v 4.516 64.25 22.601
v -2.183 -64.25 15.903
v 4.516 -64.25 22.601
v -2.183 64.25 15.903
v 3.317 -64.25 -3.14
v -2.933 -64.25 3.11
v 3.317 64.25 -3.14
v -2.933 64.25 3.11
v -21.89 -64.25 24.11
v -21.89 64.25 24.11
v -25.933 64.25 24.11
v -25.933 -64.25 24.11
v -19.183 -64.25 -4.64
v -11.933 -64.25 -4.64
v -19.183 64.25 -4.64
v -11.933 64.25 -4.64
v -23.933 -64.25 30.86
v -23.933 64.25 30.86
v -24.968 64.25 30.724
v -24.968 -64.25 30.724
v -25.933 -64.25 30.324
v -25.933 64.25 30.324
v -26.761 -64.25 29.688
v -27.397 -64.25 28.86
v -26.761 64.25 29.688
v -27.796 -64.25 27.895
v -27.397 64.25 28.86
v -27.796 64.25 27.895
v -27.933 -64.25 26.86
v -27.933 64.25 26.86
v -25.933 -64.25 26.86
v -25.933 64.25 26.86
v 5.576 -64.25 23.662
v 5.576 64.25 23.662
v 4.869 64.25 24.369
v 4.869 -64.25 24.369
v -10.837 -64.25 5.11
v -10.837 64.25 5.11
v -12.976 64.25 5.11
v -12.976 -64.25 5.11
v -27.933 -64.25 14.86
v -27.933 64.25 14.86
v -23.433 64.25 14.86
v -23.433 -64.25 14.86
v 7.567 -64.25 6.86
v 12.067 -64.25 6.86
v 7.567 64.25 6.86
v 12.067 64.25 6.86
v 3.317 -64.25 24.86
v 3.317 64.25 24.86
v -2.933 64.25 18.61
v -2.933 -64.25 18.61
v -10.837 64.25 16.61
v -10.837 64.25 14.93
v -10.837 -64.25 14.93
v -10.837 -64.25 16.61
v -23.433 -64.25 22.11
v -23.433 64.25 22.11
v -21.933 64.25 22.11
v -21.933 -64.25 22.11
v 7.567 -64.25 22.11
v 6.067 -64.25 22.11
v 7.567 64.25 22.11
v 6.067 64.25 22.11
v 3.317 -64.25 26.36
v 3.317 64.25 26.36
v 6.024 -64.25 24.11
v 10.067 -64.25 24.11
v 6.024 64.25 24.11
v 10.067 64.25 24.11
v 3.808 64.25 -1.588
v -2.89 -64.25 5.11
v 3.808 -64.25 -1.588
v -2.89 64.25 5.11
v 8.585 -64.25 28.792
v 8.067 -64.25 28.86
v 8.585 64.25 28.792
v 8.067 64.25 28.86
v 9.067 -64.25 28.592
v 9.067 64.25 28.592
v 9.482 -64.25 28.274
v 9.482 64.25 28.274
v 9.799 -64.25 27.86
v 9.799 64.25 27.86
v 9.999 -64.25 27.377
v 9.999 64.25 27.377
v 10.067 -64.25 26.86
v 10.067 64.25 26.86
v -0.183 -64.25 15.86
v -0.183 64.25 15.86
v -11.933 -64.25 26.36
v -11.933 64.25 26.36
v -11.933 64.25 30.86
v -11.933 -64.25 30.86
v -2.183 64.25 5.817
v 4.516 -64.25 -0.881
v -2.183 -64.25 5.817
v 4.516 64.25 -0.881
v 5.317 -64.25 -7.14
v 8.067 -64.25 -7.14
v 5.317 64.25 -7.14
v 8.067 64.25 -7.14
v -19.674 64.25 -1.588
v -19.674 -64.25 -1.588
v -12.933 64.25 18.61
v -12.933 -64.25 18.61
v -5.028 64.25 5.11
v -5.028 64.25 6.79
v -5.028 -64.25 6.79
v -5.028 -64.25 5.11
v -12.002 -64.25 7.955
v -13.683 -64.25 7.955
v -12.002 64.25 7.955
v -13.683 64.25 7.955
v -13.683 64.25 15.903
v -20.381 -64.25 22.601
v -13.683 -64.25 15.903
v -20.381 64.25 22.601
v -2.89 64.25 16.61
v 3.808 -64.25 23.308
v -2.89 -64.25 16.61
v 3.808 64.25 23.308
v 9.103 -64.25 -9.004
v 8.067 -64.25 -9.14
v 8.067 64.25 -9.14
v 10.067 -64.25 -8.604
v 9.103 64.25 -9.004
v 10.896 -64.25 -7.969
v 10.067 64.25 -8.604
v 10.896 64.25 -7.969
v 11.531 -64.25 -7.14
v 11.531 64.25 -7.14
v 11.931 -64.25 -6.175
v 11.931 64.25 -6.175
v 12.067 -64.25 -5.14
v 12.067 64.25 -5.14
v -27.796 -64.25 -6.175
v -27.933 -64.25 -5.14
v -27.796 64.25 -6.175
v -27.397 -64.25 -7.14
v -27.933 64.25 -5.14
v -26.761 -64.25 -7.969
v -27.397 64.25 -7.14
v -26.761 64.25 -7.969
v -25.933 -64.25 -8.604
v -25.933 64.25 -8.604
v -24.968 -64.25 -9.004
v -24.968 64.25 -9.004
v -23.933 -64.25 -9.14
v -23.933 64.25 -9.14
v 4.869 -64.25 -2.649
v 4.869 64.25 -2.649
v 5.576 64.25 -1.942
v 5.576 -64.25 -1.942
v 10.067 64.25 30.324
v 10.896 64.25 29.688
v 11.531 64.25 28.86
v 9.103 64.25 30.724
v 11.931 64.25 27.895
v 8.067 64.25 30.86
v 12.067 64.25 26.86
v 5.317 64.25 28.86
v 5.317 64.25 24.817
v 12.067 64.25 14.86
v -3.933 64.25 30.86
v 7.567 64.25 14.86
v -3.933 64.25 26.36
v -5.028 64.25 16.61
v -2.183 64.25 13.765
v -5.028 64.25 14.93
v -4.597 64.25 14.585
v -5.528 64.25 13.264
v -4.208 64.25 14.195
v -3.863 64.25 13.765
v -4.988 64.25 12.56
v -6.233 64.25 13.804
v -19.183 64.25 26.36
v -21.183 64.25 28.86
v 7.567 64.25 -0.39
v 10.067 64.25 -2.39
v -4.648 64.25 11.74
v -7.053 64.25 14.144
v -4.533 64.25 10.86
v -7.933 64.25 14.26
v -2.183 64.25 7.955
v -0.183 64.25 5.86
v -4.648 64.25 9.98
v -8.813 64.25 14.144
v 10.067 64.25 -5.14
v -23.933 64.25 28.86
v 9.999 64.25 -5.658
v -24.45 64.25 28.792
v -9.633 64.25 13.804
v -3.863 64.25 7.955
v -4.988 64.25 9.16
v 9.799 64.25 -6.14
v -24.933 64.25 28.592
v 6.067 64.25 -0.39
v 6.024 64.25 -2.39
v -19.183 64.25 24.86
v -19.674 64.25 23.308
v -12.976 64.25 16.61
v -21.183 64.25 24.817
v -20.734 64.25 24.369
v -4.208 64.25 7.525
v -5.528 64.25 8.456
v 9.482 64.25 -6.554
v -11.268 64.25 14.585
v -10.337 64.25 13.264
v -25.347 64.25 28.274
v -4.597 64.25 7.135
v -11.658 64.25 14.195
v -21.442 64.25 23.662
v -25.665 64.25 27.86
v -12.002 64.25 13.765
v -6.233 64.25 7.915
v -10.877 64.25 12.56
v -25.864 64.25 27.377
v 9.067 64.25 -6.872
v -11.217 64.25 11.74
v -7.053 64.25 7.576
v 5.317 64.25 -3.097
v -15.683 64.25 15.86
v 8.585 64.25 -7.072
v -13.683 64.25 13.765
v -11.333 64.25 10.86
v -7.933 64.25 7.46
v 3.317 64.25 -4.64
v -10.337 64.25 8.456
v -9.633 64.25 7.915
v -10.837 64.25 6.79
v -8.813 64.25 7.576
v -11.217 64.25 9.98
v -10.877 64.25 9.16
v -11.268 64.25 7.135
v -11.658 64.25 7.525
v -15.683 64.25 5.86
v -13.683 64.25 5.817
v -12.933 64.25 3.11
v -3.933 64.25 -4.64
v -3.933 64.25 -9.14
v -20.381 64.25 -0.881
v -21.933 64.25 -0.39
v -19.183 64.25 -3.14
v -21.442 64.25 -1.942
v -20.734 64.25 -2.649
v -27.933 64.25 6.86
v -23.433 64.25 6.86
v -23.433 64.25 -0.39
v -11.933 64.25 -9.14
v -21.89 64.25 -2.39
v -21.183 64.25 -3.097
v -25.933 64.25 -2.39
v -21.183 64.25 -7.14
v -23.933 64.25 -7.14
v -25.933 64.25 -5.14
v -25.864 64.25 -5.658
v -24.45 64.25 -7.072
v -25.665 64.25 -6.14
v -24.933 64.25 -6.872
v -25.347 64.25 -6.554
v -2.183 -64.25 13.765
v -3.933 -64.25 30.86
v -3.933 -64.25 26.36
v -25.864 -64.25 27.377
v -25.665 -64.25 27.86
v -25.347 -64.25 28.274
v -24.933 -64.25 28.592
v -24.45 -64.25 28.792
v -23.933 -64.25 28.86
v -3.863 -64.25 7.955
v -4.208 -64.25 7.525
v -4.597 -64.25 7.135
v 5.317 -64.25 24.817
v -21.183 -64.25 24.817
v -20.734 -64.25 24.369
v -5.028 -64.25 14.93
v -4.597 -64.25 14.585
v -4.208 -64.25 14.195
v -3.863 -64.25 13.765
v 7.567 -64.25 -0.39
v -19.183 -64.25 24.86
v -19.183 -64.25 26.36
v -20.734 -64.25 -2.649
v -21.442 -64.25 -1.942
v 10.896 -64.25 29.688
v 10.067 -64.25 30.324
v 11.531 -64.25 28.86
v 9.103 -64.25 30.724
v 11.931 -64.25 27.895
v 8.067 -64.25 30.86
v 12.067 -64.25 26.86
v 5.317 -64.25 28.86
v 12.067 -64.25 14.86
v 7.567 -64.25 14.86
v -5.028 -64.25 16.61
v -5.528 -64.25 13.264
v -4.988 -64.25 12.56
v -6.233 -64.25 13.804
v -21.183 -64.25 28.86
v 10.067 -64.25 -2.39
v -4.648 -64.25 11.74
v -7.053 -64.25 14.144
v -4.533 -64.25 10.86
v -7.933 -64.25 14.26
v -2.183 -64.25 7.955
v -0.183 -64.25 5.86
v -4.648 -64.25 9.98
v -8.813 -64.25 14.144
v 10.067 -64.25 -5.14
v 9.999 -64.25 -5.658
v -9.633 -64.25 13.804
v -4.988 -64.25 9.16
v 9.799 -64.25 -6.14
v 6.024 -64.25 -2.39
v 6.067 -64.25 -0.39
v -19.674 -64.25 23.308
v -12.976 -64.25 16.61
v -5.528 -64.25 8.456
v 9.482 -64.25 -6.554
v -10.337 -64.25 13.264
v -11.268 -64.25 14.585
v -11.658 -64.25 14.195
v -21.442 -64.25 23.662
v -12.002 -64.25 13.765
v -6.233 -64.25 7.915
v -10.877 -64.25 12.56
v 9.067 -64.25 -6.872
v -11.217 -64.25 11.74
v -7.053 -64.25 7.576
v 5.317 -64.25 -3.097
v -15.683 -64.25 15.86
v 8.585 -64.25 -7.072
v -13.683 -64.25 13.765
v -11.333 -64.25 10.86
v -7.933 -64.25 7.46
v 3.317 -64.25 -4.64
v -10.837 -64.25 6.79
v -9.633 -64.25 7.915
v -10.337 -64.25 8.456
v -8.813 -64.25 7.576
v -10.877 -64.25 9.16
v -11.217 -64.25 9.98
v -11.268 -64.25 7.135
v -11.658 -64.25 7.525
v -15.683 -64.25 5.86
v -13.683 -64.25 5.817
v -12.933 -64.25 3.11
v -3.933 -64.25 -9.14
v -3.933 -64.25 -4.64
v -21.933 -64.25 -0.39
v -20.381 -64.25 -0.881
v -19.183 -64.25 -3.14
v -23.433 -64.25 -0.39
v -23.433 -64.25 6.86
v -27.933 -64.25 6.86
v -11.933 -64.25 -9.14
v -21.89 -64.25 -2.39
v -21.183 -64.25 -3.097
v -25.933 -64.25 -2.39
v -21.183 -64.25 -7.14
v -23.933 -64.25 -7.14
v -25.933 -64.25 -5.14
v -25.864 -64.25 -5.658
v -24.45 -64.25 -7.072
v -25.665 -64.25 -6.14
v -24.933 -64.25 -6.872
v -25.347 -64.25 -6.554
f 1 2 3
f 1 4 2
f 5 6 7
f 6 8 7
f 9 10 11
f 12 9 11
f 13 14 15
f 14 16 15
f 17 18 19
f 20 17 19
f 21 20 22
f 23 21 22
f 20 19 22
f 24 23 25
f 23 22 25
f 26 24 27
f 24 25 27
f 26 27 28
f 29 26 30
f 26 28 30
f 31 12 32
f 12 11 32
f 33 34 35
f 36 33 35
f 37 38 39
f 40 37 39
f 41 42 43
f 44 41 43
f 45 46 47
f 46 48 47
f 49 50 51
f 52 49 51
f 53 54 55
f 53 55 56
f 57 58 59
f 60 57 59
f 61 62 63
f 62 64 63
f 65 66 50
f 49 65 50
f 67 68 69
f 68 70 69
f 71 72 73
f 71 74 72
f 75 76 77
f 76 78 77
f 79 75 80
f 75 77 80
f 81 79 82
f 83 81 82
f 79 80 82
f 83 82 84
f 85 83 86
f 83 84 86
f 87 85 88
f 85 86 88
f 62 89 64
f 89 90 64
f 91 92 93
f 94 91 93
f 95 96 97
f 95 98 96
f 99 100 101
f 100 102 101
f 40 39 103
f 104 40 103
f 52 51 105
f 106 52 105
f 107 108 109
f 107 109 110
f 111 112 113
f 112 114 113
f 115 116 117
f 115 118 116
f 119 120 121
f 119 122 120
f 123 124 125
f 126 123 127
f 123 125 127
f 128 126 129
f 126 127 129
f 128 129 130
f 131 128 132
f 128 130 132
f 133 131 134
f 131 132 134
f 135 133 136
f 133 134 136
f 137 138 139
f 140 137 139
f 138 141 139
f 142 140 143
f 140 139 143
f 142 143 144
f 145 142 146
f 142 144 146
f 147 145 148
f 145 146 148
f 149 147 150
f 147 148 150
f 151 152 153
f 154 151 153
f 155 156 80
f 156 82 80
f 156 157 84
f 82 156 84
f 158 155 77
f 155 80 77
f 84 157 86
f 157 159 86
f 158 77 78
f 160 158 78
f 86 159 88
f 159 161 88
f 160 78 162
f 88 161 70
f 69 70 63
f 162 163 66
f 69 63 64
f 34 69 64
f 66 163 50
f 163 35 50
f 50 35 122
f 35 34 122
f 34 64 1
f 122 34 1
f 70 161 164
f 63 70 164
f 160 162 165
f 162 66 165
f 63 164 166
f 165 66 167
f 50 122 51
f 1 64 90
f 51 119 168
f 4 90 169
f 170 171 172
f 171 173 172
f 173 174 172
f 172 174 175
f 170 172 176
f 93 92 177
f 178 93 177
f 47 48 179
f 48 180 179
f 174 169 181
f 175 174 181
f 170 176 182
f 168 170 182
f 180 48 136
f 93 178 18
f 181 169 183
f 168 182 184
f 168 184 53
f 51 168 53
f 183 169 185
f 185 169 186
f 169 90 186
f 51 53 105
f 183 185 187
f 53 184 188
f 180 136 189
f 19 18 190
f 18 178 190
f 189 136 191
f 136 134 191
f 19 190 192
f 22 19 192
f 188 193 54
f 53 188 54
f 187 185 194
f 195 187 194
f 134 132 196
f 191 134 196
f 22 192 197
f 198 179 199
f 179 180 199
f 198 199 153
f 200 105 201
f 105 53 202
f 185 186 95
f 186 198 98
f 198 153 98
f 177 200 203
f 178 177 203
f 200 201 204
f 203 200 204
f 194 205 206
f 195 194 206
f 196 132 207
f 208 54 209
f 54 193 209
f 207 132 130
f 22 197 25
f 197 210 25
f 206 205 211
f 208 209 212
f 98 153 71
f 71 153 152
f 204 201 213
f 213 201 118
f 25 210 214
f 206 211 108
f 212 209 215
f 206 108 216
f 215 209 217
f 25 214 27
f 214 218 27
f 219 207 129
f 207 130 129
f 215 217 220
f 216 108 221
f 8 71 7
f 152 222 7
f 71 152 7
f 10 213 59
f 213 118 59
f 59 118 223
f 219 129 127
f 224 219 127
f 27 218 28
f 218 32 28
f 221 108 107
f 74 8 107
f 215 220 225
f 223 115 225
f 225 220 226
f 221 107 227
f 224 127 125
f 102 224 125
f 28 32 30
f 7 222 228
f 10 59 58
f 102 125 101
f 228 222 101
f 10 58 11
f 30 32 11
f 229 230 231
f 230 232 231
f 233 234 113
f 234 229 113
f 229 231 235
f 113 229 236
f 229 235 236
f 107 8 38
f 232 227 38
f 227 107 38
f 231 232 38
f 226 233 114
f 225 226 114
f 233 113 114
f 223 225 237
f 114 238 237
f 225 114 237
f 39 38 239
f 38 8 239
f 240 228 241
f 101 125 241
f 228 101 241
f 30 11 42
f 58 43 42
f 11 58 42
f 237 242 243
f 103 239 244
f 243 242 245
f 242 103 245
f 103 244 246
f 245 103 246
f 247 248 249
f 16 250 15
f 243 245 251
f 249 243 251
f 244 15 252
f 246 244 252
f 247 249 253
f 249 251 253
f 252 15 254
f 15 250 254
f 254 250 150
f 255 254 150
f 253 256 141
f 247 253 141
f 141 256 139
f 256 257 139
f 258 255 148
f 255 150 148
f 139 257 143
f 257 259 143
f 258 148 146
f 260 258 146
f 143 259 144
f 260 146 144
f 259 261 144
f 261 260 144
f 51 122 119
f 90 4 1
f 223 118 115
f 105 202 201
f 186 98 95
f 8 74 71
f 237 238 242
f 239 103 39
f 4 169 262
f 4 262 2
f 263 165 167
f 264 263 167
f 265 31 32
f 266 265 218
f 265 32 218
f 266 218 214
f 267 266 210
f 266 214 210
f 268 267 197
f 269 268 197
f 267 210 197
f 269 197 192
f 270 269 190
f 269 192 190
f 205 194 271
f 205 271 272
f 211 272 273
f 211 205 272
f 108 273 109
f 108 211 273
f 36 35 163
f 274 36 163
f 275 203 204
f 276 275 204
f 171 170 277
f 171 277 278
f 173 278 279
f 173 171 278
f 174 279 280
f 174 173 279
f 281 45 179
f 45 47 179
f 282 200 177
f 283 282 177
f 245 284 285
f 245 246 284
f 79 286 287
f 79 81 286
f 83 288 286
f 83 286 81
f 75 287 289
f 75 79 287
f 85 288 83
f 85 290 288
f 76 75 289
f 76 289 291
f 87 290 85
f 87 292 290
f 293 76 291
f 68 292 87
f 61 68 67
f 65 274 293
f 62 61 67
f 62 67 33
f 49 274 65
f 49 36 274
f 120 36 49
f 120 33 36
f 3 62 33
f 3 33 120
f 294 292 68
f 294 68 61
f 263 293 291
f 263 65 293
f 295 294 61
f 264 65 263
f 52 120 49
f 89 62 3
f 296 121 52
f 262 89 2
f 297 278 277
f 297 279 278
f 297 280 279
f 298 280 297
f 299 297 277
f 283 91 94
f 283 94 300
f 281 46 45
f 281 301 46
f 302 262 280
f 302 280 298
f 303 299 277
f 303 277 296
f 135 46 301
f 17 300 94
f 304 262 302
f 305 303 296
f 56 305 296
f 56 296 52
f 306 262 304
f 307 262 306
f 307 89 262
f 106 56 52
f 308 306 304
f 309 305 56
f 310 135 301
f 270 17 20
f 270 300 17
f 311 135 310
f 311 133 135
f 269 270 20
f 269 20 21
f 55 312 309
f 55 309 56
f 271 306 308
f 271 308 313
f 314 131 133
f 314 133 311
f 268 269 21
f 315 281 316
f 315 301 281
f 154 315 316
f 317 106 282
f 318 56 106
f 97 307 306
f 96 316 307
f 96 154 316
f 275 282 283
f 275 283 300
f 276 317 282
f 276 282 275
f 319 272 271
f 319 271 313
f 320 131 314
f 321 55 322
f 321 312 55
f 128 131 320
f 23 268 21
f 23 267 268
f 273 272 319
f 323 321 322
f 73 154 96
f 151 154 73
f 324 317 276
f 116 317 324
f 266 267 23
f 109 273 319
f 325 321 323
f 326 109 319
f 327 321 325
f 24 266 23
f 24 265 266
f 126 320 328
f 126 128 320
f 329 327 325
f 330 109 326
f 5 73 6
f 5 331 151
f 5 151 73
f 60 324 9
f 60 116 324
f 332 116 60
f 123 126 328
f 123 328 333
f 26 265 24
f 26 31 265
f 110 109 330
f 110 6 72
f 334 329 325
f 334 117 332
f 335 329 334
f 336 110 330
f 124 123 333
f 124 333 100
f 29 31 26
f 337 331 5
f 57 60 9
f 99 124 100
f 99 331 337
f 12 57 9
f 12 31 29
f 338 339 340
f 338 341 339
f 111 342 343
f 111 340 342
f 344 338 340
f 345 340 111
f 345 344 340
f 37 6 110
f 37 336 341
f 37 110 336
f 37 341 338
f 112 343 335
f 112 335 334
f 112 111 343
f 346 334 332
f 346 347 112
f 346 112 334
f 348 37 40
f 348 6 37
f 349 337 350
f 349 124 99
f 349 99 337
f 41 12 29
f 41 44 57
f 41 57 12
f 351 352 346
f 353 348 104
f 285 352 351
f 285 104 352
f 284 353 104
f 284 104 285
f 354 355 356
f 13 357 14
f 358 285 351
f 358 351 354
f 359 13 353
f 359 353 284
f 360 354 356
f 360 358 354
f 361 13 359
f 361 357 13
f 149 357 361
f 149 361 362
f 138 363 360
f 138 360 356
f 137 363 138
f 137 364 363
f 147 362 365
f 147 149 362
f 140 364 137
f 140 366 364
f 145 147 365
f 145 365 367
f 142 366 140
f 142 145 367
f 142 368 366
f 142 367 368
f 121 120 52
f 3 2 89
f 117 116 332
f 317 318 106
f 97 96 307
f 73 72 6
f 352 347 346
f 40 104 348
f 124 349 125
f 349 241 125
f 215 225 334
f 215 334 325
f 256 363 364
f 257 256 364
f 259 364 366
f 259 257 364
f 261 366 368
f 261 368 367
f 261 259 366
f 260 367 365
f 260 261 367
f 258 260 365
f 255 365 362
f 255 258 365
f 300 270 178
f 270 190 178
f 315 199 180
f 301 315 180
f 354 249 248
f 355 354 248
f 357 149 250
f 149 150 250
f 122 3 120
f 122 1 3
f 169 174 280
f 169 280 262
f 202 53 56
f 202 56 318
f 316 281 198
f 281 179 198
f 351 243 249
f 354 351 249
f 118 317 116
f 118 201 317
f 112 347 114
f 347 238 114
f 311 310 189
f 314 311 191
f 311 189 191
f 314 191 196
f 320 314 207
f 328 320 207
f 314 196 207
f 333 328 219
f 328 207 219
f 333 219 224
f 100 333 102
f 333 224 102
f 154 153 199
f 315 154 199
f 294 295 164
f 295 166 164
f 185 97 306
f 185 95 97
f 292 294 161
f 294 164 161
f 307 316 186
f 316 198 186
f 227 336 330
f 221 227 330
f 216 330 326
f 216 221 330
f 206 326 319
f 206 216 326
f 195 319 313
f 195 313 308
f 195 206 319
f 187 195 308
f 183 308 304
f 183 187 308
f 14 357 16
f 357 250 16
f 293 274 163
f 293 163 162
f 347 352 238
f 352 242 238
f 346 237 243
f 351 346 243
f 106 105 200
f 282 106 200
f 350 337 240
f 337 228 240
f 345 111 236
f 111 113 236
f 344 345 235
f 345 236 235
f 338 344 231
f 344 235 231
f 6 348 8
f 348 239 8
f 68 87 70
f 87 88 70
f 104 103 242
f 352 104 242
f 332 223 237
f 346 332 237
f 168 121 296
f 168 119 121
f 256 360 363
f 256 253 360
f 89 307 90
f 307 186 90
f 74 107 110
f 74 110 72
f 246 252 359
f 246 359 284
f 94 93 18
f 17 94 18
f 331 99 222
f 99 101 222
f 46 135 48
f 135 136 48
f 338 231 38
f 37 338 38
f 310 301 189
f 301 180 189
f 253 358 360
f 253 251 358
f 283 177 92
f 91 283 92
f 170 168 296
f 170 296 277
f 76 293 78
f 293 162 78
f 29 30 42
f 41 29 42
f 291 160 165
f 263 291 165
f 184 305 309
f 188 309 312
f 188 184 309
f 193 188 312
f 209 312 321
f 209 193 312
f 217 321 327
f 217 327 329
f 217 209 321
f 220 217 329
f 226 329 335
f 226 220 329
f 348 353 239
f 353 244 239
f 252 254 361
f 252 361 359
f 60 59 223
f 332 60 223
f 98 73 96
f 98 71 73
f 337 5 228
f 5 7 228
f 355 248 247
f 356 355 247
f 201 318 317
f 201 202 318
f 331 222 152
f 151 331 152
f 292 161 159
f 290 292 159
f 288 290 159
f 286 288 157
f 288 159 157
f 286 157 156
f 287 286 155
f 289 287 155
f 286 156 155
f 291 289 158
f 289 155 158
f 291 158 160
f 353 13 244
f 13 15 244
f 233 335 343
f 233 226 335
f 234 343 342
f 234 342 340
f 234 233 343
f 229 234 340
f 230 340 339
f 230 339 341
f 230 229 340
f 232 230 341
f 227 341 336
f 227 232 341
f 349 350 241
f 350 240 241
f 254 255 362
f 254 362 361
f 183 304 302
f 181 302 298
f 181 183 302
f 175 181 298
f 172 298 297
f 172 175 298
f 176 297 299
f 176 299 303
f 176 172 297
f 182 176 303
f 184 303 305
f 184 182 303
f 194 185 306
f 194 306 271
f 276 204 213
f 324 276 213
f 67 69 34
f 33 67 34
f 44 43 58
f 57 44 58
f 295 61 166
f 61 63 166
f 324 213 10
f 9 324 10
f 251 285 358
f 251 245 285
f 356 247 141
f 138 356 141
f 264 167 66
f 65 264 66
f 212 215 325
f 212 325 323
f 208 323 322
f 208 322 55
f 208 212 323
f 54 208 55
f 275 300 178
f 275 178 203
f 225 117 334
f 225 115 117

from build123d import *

# Parameters (mm, degrees)
BOSS_EXTRUDE1_DEPTH = 64.25


with BuildPart() as part:
    # Sketch1 → Boss-Extrude1 (new body, symmetric)
    with BuildSketch(Plane(origin=(0, 0, 0), x_dir=(1, 0, 0), z_dir=(0, 1, 0))):
        with BuildLine():
            Line((-27.932619, -6.859853), (-27.932619, 5.140147))
            ThreePointArc((-27.932619, 5.140147), (-26.761046, 7.968574), (-23.932619, 9.140147))
            Line((-23.932619, 9.140147), (-11.932619, 9.140147))
            Line((-11.932619, 9.140147), (-11.932619, 4.640147))
            Line((-11.932619, 4.640147), (-19.182619, 4.640147))
            Line((-19.182619, 4.640147), (-19.182619, 3.140147))
            Line((-19.182619, 3.140147), (-12.932619, -3.109853))
            Line((-12.932619, -3.109853), (-7.932619, -3.109853))
            Line((-7.932619, -3.109853), (-2.932619, -3.109853))
            Line((-2.932619, -3.109853), (3.317381, 3.140147))
            Line((3.317381, 3.140147), (3.317381, 4.640147))
            Line((3.317381, 4.640147), (-3.932619, 4.640147))
            Line((-3.932619, 4.640147), (-3.932619, 9.140147))
            Line((-3.932619, 9.140147), (8.067381, 9.140147))
            ThreePointArc((8.067381, 9.140147), (10.895808, 7.968574), (12.067381, 5.140147))
            Line((12.067381, 5.140147), (12.067381, -6.859853))
            Line((12.067381, -6.859853), (7.567381, -6.859853))
            Line((7.567381, -6.859853), (7.567381, 0.390147))
            Line((7.567381, 0.390147), (6.067381, 0.390147))
            Line((6.067381, 0.390147), (-0.182619, -5.859853))
            Line((-0.182619, -5.859853), (-0.182619, -10.859853))
            Line((-0.182619, -10.859853), (-0.182619, -15.859853))
            Line((-0.182619, -15.859853), (6.067381, -22.109853))
            Line((6.067381, -22.109853), (7.567381, -22.109853))
            Line((7.567381, -22.109853), (7.567381, -14.859853))
            Line((7.567381, -14.859853), (12.067381, -14.859853))
            Line((12.067381, -14.859853), (12.067381, -26.859853))
            ThreePointArc((12.067381, -26.859853), (10.895808, -29.68828), (8.067381, -30.859853))
            Line((8.067381, -30.859853), (-3.932619, -30.859853))
            Line((-3.932619, -30.859853), (-3.932619, -26.359853))
            Line((-3.932619, -26.359853), (3.317381, -26.359853))
            Line((3.317381, -26.359853), (3.317381, -24.859853))
            Line((3.317381, -24.859853), (-2.932619, -18.609853))
            Line((-2.932619, -18.609853), (-7.932619, -18.609853))
            Line((-7.932619, -18.609853), (-12.932619, -18.609853))
            Line((-12.932619, -18.609853), (-19.182619, -24.859853))
            Line((-19.182619, -24.859853), (-19.182619, -26.359853))
            Line((-19.182619, -26.359853), (-11.932619, -26.359853))
            Line((-11.932619, -26.359853), (-11.932619, -30.859853))
            Line((-11.932619, -30.859853), (-23.932619, -30.859853))
            ThreePointArc((-23.932619, -30.859853), (-26.761046, -29.68828), (-27.932619, -26.859853))
            Line((-27.932619, -26.859853), (-27.932619, -14.859853))
            Line((-27.932619, -14.859853), (-23.432619, -14.859853))
            Line((-23.432619, -14.859853), (-23.432619, -22.109853))
            Line((-23.432619, -22.109853), (-21.932619, -22.109853))
            Line((-21.932619, -22.109853), (-15.682619, -15.859853))
            Line((-15.682619, -15.859853), (-15.682619, -10.859853))
            Line((-15.682619, -10.859853), (-15.682619, -5.859853))
            Line((-15.682619, -5.859853), (-21.932619, 0.390147))
            Line((-21.932619, 0.390147), (-23.432619, 0.390147))
            Line((-23.432619, 0.390147), (-23.432619, -6.859853))
            Line((-23.432619, -6.859853), (-27.932619, -6.859853))
        make_face()
        with BuildLine():
            Line((-25.932619, 2.390147), (-25.932619, 5.140147))
            ThreePointArc((-25.932619, 5.140147), (-25.346832, 6.554361), (-23.932619, 7.140147))
            Line((-23.932619, 7.140147), (-21.182619, 7.140147))
            Line((-21.182619, 7.140147), (-21.182619, 3.097254))
            Line((-21.182619, 3.097254), (-20.734396, 2.649031))
            Line((-20.734396, 2.649031), (-21.441502, 1.941924))
            Line((-21.441502, 1.941924), (-21.889726, 2.390147))
            Line((-21.889726, 2.390147), (-25.932619, 2.390147))
        make_face(mode=Mode.SUBTRACT)
        with BuildLine():
            Line((-20.380842, 0.881264), (-13.682619, -5.816959))
            Line((-13.682619, -5.816959), (-13.682619, -7.955115))
            Line((-13.682619, -7.955115), (-13.182619, -7.955115))
            Line((-13.182619, -7.955115), (-12.002324, -7.955115))
            ThreePointArc((-12.002324, -7.955115), (-11.468153, -7.324319), (-10.837356, -6.790148))
            Line((-10.837356, -6.790148), (-10.837356, -5.609853))
            Line((-10.837356, -5.609853), (-10.837356, -5.109853))
            Line((-10.837356, -5.109853), (-12.975512, -5.109853))
            Line((-12.975512, -5.109853), (-19.673735, 1.588371))
            Line((-19.673735, 1.588371), (-20.380842, 0.881264))
        make_face(mode=Mode.SUBTRACT)
        with BuildLine():
            Line((10.067381, 2.390147), (10.067381, 5.140147))
            ThreePointArc((10.067381, 5.140147), (9.481595, 6.554361), (8.067381, 7.140147))
            Line((8.067381, 7.140147), (5.317381, 7.140147))
            Line((5.317381, 7.140147), (5.317381, 3.097254))
            Line((5.317381, 3.097254), (4.869158, 2.649031))
            Line((4.869158, 2.649031), (5.576265, 1.941924))
            Line((5.576265, 1.941924), (6.024488, 2.390147))
            Line((6.024488, 2.390147), (10.067381, 2.390147))
        make_face(mode=Mode.SUBTRACT)
        with BuildLine():
            Line((-2.182619, -5.816959), (-2.182619, -7.955115))
            Line((-2.182619, -7.955115), (-2.682619, -7.955115))
            Line((-2.682619, -7.955115), (-3.862914, -7.955115))
            ThreePointArc((-3.862914, -7.955115), (-4.397085, -7.324319), (-5.027881, -6.790148))
            Line((-5.027881, -6.790148), (-5.027881, -5.609853))
            Line((-5.027881, -5.609853), (-5.027881, -5.109853))
            Line((-5.027881, -5.109853), (-2.889726, -5.109853))
            Line((-2.889726, -5.109853), (3.808498, 1.588371))
            Line((3.808498, 1.588371), (4.515604, 0.881264))
            Line((4.515604, 0.881264), (-2.182619, -5.816959))
        make_face(mode=Mode.SUBTRACT)
        with BuildLine():
            Line((5.317381, -28.859853), (8.067381, -28.859853))
            ThreePointArc((8.067381, -28.859853), (9.481595, -28.274066), (10.067381, -26.859853))
            Line((10.067381, -26.859853), (10.067381, -24.109853))
            Line((10.067381, -24.109853), (6.024488, -24.109853))
            Line((6.024488, -24.109853), (5.576265, -23.661629))
            Line((5.576265, -23.661629), (4.869158, -24.368736))
            Line((4.869158, -24.368736), (5.317381, -24.816959))
            Line((5.317381, -24.816959), (5.317381, -28.859853))
        make_face(mode=Mode.SUBTRACT)
        with BuildLine():
            Line((-2.889726, -16.609853), (-5.027881, -16.609853))
            Line((-5.027881, -16.609853), (-5.027881, -16.109853))
            Line((-5.027881, -16.109853), (-5.027881, -14.929558))
            ThreePointArc((-5.027881, -14.929558), (-4.397085, -14.395387), (-3.862914, -13.76459))
            Line((-3.862914, -13.76459), (-2.682619, -13.76459))
            Line((-2.682619, -13.76459), (-2.182619, -13.76459))
            Line((-2.182619, -13.76459), (-2.182619, -15.902746))
            Line((-2.182619, -15.902746), (4.515604, -22.600969))
            Line((4.515604, -22.600969), (3.808498, -23.308076))
            Line((3.808498, -23.308076), (-2.889726, -16.609853))
        make_face(mode=Mode.SUBTRACT)
        with BuildLine():
            Line((-25.932619, -24.109853), (-25.932619, -26.859853))
            ThreePointArc((-25.932619, -26.859853), (-25.346832, -28.274066), (-23.932619, -28.859853))
            Line((-23.932619, -28.859853), (-21.182619, -28.859853))
            Line((-21.182619, -28.859853), (-21.182619, -24.816959))
            Line((-21.182619, -24.816959), (-20.734396, -24.368736))
            Line((-20.734396, -24.368736), (-21.441502, -23.661629))
            Line((-21.441502, -23.661629), (-21.889726, -24.109853))
            Line((-21.889726, -24.109853), (-25.932619, -24.109853))
        make_face(mode=Mode.SUBTRACT)
        with BuildLine():
            Line((-13.682619, -15.902746), (-13.682619, -13.76459))
            Line((-13.682619, -13.76459), (-13.182619, -13.76459))
            Line((-13.182619, -13.76459), (-12.002324, -13.76459))
            ThreePointArc((-12.002324, -13.76459), (-11.468153, -14.395387), (-10.837356, -14.929558))
            Line((-10.837356, -14.929558), (-10.837356, -16.109853))
            Line((-10.837356, -16.109853), (-10.837356, -16.609853))
            Line((-10.837356, -16.609853), (-12.975512, -16.609853))
            Line((-12.975512, -16.609853), (-19.673735, -23.308076))
            Line((-19.673735, -23.308076), (-20.380842, -22.600969))
            Line((-20.380842, -22.600969), (-13.682619, -15.902746))
        make_face(mode=Mode.SUBTRACT)
        with BuildLine():
            ThreePointArc((-11.332619, -10.859853), (-10.336782, -8.45569), (-7.932619, -7.459853))
            ThreePointArc((-7.932619, -7.459853), (-5.528456, -8.45569), (-4.532619, -10.859853))
            ThreePointArc((-4.532619, -10.859853), (-5.528456, -13.264016), (-7.932619, -14.259853))
            ThreePointArc((-7.932619, -14.259853), (-10.336782, -13.264016), (-11.332619, -10.859853))
        make_face(mode=Mode.SUBTRACT)
    extrude(amount=BOSS_EXTRUDE1_DEPTH, both=True)


solid = part.part
